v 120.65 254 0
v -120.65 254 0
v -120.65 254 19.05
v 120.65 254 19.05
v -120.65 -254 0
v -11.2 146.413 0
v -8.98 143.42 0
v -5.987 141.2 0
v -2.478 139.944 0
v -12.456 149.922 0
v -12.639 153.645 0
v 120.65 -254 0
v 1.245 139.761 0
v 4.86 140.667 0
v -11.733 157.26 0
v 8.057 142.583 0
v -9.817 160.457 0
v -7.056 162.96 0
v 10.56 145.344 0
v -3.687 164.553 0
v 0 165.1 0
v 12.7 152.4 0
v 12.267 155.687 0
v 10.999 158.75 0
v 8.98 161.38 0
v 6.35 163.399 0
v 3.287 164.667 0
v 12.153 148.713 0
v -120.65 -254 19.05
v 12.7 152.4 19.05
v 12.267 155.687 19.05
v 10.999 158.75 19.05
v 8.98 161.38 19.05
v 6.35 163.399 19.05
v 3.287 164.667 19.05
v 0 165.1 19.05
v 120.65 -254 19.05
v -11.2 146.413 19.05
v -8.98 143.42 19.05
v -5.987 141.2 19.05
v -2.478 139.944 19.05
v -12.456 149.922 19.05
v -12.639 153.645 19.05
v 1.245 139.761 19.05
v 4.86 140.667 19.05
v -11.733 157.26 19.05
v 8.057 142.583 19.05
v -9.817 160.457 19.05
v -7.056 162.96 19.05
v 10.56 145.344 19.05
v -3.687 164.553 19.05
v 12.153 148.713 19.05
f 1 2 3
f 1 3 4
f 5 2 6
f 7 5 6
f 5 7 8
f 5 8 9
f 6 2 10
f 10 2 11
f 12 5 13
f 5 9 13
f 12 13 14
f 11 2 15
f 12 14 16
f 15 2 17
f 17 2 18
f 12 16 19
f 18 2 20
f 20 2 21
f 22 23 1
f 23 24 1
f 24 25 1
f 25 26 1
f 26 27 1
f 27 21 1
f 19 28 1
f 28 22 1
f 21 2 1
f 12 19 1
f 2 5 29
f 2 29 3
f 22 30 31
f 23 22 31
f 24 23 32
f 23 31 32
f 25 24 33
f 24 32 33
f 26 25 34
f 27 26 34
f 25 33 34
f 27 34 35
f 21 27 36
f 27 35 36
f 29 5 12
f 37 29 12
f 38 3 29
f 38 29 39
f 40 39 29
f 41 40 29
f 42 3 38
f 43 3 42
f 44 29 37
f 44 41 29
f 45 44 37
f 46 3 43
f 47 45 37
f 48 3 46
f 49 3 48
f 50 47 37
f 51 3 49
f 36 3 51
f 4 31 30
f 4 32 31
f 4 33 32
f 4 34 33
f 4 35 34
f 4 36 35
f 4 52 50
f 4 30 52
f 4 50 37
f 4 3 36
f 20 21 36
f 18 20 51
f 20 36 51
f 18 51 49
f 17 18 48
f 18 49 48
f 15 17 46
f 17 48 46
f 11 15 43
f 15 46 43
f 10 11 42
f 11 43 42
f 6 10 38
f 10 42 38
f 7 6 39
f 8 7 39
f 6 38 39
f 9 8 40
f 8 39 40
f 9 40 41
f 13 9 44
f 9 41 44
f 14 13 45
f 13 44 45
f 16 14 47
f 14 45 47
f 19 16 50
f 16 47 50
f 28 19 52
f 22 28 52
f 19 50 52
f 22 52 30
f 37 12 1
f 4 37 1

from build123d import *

# Parameters (mm, degrees)
F0_W     = 241.3
F0_H     = 508
F1_DEPTH = 19.05
F3_DEPTH = 19.051


with BuildPart() as f1:
    # F0 (on Top) → F1 (new body)
    with BuildSketch(Plane.XY):
        Rectangle(F0_W, F0_H)
    extrude(amount=F1_DEPTH)

    # F2 (on face) → F3 (cut, through all)
    with BuildSketch(Plane.XY.offset(19.05)):
        with BuildLine():
            ThreePointArc((12.7, 152.4), (8.980256, 161.380256), (0, 165.1))
            ThreePointArc((0, 165.1), (-8.980256, 143.419744), (12.7, 152.4))
        make_face()
    extrude(amount=-F3_DEPTH, mode=Mode.SUBTRACT)


solid = f1.part
